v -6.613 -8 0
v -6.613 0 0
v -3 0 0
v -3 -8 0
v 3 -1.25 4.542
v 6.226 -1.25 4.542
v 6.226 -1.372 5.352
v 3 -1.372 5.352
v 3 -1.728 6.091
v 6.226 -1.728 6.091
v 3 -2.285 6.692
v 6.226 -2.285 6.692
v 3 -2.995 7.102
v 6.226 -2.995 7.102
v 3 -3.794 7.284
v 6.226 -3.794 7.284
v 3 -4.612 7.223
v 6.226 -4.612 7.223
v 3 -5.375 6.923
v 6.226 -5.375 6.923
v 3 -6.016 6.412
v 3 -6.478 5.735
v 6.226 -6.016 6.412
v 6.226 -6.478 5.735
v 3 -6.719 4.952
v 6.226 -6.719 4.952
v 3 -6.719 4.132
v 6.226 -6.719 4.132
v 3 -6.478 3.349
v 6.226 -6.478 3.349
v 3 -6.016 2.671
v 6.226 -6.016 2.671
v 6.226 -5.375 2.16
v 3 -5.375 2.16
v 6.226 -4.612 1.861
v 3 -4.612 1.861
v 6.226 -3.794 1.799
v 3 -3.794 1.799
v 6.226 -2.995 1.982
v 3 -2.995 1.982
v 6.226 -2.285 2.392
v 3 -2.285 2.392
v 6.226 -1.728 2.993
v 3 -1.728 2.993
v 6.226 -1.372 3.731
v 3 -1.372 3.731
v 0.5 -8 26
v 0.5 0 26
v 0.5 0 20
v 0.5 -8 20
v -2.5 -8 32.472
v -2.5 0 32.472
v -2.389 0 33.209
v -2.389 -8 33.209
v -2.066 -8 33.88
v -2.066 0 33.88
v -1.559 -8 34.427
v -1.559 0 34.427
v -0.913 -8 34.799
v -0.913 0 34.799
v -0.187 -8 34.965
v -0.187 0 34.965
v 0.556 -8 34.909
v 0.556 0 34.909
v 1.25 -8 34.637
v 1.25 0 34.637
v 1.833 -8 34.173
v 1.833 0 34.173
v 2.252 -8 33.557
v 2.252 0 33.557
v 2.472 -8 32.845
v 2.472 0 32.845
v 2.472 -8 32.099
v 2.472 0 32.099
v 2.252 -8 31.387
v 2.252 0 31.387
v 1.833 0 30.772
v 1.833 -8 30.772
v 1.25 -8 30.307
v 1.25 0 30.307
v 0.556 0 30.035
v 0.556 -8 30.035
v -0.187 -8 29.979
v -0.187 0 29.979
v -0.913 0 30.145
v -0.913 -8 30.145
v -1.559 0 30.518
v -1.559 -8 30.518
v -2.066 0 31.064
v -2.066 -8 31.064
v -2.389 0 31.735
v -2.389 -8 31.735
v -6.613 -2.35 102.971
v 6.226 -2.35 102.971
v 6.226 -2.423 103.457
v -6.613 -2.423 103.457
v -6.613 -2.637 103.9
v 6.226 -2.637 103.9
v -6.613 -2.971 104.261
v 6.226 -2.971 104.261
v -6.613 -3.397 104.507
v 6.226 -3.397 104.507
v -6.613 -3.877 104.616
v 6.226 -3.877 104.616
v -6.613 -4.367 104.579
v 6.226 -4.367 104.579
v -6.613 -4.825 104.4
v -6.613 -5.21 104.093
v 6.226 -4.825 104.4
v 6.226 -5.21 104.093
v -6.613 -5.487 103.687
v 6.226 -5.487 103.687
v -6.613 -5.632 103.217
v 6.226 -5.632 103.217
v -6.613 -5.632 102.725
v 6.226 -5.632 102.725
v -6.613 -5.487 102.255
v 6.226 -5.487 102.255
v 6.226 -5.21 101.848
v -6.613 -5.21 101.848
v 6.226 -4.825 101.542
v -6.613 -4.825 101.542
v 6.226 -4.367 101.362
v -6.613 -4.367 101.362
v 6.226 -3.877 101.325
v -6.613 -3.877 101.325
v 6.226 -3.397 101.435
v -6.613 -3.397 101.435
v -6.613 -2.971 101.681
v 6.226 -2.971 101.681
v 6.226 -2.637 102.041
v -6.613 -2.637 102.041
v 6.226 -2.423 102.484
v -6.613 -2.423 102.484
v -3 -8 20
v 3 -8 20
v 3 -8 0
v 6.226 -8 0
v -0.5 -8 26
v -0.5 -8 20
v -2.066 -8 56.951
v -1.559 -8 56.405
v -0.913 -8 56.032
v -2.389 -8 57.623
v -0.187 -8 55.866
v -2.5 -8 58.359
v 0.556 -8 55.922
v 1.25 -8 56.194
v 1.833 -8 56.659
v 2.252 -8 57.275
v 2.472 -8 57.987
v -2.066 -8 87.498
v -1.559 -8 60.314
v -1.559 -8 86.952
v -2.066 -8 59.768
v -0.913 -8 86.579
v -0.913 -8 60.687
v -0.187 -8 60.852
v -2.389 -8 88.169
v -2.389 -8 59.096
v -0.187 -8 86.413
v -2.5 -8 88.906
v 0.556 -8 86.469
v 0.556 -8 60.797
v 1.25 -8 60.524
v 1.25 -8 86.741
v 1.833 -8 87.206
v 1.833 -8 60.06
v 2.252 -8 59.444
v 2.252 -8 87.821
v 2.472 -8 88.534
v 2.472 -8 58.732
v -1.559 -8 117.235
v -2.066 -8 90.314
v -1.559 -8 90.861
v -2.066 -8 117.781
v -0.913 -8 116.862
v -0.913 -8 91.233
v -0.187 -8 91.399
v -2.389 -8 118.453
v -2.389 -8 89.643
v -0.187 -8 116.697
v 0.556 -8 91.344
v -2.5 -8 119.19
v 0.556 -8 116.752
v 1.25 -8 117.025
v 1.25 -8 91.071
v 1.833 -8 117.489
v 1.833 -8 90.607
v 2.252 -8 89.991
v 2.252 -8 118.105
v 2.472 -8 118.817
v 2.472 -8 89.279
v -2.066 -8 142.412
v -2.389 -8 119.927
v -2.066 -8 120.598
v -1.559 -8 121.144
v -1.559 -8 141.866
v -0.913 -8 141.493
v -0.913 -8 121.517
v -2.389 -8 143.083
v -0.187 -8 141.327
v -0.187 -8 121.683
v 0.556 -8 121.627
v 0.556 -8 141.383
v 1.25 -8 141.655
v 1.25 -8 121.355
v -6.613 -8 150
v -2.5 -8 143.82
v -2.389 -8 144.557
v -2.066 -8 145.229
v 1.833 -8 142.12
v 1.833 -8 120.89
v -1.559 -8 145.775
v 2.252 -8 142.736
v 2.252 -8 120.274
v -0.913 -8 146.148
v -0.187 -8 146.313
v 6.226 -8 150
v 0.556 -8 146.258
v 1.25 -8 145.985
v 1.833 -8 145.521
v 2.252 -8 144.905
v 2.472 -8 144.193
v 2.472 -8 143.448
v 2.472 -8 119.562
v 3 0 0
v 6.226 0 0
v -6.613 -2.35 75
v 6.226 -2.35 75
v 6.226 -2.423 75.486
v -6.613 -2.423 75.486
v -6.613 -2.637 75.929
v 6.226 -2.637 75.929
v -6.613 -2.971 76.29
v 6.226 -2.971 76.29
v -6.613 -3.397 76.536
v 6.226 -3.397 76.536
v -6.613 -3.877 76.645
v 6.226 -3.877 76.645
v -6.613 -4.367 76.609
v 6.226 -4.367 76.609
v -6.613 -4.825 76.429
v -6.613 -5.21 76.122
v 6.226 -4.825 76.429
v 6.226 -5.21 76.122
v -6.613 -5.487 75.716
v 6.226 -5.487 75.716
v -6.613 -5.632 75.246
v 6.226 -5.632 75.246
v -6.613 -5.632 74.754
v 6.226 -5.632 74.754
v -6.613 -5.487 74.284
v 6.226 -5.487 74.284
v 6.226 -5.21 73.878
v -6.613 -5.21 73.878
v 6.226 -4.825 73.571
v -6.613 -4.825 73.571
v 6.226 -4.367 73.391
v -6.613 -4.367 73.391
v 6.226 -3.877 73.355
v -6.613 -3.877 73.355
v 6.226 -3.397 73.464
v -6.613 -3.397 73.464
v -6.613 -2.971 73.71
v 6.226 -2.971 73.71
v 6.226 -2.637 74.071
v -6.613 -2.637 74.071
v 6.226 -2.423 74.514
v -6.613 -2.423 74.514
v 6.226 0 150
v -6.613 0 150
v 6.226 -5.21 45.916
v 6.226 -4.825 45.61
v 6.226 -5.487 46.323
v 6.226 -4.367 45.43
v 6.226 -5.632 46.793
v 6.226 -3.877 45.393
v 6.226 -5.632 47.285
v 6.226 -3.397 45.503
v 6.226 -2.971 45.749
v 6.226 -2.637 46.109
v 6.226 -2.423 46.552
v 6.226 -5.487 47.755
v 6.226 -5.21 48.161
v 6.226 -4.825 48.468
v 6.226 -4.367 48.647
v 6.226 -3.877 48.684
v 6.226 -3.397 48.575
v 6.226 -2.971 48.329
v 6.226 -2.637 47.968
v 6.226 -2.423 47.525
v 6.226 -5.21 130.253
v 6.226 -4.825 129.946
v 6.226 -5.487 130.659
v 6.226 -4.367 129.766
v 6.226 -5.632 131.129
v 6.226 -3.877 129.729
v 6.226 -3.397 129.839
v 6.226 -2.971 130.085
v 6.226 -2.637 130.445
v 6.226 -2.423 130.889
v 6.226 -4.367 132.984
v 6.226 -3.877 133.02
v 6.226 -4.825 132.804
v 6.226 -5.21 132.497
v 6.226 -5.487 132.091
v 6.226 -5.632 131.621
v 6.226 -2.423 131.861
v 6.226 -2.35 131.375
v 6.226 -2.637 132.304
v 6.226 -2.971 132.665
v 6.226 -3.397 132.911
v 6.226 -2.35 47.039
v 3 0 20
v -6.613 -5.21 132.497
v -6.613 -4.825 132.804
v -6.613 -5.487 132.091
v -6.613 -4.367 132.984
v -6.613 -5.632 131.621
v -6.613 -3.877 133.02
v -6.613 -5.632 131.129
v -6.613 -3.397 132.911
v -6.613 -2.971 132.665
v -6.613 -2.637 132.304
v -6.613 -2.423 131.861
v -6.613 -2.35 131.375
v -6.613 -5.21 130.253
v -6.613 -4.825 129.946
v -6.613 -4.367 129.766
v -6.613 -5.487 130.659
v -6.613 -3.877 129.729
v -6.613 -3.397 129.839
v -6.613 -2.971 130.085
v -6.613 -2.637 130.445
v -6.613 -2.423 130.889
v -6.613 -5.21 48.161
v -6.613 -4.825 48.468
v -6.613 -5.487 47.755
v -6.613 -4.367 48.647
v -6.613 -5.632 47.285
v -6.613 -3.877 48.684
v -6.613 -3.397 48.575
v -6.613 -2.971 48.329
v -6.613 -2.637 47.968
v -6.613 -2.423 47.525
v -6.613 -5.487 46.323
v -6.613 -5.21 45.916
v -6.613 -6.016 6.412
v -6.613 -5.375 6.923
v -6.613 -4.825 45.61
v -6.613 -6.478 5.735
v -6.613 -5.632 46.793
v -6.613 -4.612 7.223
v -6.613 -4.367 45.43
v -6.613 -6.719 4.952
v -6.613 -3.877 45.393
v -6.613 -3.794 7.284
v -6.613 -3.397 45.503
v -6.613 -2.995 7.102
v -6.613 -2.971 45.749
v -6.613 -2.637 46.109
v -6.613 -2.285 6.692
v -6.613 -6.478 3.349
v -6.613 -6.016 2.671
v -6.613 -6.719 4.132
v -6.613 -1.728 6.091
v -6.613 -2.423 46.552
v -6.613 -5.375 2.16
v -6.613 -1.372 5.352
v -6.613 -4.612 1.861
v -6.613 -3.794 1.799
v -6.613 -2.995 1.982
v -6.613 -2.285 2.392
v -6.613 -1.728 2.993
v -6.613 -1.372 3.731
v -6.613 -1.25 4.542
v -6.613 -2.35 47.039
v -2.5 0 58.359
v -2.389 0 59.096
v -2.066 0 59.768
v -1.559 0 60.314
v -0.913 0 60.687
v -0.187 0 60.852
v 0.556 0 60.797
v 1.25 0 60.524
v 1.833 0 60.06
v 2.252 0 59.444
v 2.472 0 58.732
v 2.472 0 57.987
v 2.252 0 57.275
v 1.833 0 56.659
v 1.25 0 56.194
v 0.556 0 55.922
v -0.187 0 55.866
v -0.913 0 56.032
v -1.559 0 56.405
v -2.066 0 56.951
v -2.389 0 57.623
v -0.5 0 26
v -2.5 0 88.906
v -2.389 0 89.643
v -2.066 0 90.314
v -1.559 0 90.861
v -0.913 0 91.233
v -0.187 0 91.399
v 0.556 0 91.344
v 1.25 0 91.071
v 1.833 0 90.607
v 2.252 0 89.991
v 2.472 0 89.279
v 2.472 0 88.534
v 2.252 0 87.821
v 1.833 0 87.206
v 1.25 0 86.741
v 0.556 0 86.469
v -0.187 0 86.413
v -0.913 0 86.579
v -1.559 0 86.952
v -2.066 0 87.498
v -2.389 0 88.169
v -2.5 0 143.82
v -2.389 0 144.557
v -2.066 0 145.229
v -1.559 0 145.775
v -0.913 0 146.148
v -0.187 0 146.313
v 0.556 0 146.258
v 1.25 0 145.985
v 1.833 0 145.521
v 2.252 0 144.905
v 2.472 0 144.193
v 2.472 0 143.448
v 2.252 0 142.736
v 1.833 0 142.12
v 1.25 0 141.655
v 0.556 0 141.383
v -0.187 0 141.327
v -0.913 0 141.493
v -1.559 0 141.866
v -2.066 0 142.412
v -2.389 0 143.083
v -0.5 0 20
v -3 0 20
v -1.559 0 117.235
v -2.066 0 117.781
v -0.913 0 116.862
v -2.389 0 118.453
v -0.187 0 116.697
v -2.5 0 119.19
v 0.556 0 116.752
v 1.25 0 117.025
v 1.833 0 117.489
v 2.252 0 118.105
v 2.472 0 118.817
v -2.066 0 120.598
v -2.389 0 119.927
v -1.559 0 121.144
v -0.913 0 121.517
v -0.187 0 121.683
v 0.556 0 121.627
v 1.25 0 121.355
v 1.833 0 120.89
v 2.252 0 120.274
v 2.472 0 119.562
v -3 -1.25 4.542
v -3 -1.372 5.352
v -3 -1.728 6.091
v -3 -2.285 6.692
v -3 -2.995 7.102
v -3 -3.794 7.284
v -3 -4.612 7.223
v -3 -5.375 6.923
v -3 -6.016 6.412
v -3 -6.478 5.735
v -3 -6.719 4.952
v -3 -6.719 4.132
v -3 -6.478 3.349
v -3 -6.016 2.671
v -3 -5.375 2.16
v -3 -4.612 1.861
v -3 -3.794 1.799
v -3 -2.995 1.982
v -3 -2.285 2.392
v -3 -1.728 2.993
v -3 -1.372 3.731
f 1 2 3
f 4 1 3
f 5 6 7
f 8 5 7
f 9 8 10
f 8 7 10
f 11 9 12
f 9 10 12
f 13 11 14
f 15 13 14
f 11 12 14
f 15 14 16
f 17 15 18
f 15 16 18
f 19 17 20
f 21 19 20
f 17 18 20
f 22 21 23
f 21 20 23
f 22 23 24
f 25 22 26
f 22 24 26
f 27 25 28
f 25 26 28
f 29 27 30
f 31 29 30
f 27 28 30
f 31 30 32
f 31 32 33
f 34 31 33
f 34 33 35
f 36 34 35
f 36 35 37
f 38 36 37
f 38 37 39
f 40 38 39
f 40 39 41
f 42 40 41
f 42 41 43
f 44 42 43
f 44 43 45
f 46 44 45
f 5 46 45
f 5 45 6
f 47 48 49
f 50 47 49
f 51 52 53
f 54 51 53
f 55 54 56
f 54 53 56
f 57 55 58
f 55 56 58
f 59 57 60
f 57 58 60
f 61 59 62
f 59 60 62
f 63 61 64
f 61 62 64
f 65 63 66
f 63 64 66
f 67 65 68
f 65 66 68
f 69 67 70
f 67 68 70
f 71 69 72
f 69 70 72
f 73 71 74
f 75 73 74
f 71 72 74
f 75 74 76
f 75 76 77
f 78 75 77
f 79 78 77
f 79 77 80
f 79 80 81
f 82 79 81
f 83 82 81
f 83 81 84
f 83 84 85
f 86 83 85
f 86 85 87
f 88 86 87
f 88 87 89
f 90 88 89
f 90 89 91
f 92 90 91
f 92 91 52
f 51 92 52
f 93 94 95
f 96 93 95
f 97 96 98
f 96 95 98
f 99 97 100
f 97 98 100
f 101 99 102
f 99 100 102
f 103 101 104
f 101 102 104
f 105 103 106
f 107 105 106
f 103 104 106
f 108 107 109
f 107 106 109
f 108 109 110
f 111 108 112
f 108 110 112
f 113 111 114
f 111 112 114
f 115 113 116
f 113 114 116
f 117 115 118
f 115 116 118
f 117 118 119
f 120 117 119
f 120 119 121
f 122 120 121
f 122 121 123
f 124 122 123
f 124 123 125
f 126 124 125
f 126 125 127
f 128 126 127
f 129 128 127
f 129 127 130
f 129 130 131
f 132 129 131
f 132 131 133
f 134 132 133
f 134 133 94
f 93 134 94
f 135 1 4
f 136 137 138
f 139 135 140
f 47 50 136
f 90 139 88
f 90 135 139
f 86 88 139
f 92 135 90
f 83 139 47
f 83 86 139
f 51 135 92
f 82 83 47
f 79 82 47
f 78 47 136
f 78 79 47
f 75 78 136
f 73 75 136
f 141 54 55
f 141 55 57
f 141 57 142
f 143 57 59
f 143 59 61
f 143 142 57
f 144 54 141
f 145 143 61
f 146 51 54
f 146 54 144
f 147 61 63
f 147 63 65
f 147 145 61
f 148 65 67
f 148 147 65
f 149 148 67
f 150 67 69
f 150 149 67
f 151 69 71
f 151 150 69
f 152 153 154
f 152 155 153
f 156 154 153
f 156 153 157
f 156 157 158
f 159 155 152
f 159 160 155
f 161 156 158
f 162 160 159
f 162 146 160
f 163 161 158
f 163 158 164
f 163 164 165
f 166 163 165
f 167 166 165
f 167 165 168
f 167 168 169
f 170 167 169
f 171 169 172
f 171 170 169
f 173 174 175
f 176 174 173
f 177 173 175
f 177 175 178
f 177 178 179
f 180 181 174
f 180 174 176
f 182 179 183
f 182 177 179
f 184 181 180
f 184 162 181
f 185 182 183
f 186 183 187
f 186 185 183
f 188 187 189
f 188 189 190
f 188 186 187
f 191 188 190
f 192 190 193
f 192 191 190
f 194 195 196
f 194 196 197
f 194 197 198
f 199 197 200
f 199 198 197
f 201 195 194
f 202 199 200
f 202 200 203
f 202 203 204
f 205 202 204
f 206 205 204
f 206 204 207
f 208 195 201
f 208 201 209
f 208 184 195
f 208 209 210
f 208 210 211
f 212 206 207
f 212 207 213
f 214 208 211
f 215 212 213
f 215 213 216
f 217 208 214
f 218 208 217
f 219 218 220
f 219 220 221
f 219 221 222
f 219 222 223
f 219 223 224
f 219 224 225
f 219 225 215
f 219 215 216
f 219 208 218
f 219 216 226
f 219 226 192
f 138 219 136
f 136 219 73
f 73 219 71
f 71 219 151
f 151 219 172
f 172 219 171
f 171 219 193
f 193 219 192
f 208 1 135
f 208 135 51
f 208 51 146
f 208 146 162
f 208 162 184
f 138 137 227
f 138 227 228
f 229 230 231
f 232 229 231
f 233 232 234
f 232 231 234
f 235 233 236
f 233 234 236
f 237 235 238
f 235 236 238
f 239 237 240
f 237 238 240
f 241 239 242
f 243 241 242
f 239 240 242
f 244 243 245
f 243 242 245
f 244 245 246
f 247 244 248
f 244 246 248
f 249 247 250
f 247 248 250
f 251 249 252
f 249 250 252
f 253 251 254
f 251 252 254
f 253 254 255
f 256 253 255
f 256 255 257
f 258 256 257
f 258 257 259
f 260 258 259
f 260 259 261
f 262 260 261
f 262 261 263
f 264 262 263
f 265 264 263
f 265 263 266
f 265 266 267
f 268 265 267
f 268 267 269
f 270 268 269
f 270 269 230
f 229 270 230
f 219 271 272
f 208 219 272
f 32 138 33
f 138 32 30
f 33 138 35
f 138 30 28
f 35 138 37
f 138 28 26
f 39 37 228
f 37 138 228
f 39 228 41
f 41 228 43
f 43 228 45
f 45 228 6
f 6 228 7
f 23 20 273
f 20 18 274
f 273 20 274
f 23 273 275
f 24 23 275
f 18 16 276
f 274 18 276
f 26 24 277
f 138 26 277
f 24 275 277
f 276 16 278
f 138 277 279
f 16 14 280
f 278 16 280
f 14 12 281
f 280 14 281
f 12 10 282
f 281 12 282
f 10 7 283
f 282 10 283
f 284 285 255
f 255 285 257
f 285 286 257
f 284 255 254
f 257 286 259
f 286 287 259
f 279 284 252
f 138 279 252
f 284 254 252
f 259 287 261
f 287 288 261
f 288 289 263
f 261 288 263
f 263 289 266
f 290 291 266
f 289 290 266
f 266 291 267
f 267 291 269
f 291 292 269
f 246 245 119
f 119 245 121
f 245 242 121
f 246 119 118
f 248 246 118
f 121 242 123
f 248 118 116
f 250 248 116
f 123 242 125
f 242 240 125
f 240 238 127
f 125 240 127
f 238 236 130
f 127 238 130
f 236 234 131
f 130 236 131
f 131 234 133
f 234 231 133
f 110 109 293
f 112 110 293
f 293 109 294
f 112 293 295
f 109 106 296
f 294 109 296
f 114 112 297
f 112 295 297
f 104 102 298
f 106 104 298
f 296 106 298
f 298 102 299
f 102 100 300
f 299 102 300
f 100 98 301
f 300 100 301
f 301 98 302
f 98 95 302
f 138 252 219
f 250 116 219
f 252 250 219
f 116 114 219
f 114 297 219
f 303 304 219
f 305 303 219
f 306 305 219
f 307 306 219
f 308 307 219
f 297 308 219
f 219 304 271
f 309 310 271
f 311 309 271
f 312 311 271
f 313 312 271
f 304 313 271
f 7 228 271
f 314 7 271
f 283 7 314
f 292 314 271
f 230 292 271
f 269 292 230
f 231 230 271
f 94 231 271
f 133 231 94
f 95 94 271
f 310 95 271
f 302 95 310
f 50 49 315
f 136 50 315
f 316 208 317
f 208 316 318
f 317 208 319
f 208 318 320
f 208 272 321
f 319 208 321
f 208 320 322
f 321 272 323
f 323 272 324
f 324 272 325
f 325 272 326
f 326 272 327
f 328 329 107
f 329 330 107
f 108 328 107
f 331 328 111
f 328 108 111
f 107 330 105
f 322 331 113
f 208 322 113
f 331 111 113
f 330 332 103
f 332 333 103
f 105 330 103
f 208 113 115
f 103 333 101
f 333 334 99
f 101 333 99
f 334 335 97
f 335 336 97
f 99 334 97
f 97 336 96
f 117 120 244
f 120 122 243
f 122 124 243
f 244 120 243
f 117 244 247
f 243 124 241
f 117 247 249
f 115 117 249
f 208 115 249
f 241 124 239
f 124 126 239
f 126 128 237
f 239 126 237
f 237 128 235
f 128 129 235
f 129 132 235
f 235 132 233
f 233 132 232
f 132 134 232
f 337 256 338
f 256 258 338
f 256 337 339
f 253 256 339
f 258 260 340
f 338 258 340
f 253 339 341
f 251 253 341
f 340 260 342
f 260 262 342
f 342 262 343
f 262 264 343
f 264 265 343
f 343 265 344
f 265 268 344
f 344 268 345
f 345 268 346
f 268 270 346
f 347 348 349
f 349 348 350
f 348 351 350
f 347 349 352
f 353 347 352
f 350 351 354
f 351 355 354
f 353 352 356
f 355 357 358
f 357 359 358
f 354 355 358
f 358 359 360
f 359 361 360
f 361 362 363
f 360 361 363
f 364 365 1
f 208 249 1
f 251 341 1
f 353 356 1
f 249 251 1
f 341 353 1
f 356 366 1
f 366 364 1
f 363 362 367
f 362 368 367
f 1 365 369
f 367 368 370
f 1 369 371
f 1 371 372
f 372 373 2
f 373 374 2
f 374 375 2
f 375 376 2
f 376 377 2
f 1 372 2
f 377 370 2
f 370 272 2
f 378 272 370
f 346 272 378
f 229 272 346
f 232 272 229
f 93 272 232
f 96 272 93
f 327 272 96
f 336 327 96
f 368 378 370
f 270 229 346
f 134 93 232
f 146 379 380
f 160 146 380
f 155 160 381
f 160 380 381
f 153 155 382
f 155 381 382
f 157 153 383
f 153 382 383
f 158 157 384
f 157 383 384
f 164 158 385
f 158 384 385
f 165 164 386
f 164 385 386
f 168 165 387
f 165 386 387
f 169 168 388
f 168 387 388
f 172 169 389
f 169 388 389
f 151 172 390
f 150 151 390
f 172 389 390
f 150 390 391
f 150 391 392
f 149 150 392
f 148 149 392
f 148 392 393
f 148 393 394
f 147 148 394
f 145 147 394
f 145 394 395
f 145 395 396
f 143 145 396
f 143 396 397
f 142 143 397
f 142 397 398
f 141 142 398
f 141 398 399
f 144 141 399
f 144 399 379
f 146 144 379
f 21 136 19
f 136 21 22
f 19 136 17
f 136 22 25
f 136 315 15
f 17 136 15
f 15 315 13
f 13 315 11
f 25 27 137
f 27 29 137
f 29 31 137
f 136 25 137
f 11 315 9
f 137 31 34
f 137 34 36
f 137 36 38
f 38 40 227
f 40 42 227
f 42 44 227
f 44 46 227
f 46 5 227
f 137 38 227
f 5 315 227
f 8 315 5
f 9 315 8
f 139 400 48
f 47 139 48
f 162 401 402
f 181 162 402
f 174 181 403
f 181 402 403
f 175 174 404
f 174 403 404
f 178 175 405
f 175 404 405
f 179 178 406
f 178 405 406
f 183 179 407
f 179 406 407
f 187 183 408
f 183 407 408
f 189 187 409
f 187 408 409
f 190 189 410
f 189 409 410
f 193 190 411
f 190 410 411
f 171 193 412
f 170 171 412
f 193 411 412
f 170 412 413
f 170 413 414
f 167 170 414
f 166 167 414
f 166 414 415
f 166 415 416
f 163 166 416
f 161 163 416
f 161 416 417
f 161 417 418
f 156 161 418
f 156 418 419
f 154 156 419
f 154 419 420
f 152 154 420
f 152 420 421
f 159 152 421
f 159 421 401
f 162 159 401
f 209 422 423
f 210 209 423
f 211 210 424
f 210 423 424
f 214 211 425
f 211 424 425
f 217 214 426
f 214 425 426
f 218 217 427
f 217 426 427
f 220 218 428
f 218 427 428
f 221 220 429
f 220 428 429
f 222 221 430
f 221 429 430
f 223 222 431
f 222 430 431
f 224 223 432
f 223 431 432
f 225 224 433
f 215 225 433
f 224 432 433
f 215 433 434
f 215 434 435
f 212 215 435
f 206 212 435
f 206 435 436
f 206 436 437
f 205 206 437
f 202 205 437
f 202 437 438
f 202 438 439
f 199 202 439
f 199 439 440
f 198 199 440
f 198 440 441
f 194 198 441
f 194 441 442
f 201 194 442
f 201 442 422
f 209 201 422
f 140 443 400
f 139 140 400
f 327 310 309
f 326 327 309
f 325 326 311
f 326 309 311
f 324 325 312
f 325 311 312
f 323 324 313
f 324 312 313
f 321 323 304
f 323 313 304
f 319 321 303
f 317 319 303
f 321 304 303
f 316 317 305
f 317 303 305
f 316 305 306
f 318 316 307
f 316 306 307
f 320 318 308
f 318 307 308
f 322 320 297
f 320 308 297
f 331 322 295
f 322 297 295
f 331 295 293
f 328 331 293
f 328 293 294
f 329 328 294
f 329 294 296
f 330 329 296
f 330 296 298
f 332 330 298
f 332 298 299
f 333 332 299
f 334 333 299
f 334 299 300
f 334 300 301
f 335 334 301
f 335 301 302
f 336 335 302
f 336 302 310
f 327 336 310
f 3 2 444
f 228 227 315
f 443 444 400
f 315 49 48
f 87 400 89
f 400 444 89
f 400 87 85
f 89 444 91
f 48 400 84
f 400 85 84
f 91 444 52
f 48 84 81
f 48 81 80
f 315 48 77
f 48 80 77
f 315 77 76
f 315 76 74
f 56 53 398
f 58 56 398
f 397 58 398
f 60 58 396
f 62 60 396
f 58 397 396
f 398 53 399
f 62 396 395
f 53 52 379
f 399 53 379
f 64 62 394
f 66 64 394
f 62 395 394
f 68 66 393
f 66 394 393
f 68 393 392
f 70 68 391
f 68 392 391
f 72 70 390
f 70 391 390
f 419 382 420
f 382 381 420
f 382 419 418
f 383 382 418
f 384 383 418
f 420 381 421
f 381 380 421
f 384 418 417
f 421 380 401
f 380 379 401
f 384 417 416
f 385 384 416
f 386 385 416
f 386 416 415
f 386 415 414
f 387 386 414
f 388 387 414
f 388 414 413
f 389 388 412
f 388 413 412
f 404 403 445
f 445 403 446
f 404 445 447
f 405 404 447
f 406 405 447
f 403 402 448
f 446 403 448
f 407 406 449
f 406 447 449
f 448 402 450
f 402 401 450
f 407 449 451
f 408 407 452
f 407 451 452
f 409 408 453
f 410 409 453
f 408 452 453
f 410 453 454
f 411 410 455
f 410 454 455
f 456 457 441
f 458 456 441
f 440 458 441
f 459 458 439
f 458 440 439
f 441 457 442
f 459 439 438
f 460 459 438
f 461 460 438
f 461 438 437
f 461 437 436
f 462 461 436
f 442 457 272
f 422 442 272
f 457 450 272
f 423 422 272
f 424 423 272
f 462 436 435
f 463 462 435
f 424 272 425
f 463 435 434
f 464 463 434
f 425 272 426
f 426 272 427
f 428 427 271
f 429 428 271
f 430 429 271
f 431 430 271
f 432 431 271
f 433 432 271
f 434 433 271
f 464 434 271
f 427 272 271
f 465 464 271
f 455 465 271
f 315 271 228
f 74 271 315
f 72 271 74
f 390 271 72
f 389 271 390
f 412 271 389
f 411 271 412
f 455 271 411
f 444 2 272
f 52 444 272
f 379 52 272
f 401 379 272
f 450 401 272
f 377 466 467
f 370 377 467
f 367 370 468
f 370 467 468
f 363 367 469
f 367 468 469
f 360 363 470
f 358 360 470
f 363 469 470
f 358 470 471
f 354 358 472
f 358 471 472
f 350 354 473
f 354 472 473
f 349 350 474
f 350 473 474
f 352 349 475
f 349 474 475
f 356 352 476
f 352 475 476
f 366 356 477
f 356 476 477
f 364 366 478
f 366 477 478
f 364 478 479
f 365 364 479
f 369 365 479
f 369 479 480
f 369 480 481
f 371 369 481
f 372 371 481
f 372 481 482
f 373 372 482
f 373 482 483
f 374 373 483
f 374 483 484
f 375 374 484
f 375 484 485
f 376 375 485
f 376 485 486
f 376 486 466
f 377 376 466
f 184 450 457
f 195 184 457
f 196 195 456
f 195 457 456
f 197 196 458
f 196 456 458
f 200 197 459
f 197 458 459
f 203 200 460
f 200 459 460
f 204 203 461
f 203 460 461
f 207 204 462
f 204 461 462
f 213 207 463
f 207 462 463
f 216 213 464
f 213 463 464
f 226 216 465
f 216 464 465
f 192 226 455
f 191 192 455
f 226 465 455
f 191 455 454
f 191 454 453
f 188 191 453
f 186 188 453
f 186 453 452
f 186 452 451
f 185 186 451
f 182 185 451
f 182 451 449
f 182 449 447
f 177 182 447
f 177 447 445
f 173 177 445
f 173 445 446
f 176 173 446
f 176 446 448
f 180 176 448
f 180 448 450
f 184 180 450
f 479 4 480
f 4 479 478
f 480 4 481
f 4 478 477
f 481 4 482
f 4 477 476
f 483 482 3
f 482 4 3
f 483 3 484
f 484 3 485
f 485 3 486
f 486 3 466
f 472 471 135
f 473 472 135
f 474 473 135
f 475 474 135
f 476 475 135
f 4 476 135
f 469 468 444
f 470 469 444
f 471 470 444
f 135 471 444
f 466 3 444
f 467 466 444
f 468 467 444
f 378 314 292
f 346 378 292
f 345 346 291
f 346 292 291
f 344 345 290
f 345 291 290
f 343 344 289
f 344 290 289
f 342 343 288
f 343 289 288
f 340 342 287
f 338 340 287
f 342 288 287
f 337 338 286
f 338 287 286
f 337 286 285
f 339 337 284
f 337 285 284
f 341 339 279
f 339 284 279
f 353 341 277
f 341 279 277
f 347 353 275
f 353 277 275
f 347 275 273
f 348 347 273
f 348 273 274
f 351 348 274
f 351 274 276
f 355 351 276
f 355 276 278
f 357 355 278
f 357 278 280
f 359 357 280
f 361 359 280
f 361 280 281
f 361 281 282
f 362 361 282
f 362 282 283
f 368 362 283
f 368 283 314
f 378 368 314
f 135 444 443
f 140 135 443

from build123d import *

# Parameters (mm, degrees)
F1_DEPTH = 8
F3_D     = 5.5
F5_D     = 5
F7_D     = 3.3


with BuildPart() as f1:
    # F0 (on Front) → F1 (new body)
    with BuildSketch(Plane.XZ):
        Polygon((-6.6129033404, 0), (-3, 0), (-3, 20), (-0.5, 20), (-0.5, 26), (0.5, 26), (0.5, 20), (3, 20), (3, 0), (6.2258067564, 0), (6.2258067564, 150), (-6.6129033404, 150), align=None)
    extrude(amount=F1_DEPTH)

    # F3 (through all)
    with Locations(Plane(origin=(-6.6129033404, 0, 0), x_dir=(0, -1, 0), z_dir=(-1, 0, 0))):
        with Locations((4, 4.5417556539)):
            Hole(F3_D / 2)

    # F5 (through all)
    with Locations(Plane.XZ.offset(8)):
        with Locations((0, 32.4720963836), (0, 58.3593994379), (0, 88.90619874), (0, 119.1896349192), (0, 143.8203305006)):
            Hole(F5_D / 2)

    # F7 (through all)
    with Locations(Plane(origin=(-6.6129033404, 0, 0), x_dir=(0, -1, 0), z_dir=(-1, 0, 0))):
        with Locations((4, 131.3748806715), (4, 102.970726788), (4, 75), (4, 47.0387488604)):
            Hole(F7_D / 2)


solid = f1.part
